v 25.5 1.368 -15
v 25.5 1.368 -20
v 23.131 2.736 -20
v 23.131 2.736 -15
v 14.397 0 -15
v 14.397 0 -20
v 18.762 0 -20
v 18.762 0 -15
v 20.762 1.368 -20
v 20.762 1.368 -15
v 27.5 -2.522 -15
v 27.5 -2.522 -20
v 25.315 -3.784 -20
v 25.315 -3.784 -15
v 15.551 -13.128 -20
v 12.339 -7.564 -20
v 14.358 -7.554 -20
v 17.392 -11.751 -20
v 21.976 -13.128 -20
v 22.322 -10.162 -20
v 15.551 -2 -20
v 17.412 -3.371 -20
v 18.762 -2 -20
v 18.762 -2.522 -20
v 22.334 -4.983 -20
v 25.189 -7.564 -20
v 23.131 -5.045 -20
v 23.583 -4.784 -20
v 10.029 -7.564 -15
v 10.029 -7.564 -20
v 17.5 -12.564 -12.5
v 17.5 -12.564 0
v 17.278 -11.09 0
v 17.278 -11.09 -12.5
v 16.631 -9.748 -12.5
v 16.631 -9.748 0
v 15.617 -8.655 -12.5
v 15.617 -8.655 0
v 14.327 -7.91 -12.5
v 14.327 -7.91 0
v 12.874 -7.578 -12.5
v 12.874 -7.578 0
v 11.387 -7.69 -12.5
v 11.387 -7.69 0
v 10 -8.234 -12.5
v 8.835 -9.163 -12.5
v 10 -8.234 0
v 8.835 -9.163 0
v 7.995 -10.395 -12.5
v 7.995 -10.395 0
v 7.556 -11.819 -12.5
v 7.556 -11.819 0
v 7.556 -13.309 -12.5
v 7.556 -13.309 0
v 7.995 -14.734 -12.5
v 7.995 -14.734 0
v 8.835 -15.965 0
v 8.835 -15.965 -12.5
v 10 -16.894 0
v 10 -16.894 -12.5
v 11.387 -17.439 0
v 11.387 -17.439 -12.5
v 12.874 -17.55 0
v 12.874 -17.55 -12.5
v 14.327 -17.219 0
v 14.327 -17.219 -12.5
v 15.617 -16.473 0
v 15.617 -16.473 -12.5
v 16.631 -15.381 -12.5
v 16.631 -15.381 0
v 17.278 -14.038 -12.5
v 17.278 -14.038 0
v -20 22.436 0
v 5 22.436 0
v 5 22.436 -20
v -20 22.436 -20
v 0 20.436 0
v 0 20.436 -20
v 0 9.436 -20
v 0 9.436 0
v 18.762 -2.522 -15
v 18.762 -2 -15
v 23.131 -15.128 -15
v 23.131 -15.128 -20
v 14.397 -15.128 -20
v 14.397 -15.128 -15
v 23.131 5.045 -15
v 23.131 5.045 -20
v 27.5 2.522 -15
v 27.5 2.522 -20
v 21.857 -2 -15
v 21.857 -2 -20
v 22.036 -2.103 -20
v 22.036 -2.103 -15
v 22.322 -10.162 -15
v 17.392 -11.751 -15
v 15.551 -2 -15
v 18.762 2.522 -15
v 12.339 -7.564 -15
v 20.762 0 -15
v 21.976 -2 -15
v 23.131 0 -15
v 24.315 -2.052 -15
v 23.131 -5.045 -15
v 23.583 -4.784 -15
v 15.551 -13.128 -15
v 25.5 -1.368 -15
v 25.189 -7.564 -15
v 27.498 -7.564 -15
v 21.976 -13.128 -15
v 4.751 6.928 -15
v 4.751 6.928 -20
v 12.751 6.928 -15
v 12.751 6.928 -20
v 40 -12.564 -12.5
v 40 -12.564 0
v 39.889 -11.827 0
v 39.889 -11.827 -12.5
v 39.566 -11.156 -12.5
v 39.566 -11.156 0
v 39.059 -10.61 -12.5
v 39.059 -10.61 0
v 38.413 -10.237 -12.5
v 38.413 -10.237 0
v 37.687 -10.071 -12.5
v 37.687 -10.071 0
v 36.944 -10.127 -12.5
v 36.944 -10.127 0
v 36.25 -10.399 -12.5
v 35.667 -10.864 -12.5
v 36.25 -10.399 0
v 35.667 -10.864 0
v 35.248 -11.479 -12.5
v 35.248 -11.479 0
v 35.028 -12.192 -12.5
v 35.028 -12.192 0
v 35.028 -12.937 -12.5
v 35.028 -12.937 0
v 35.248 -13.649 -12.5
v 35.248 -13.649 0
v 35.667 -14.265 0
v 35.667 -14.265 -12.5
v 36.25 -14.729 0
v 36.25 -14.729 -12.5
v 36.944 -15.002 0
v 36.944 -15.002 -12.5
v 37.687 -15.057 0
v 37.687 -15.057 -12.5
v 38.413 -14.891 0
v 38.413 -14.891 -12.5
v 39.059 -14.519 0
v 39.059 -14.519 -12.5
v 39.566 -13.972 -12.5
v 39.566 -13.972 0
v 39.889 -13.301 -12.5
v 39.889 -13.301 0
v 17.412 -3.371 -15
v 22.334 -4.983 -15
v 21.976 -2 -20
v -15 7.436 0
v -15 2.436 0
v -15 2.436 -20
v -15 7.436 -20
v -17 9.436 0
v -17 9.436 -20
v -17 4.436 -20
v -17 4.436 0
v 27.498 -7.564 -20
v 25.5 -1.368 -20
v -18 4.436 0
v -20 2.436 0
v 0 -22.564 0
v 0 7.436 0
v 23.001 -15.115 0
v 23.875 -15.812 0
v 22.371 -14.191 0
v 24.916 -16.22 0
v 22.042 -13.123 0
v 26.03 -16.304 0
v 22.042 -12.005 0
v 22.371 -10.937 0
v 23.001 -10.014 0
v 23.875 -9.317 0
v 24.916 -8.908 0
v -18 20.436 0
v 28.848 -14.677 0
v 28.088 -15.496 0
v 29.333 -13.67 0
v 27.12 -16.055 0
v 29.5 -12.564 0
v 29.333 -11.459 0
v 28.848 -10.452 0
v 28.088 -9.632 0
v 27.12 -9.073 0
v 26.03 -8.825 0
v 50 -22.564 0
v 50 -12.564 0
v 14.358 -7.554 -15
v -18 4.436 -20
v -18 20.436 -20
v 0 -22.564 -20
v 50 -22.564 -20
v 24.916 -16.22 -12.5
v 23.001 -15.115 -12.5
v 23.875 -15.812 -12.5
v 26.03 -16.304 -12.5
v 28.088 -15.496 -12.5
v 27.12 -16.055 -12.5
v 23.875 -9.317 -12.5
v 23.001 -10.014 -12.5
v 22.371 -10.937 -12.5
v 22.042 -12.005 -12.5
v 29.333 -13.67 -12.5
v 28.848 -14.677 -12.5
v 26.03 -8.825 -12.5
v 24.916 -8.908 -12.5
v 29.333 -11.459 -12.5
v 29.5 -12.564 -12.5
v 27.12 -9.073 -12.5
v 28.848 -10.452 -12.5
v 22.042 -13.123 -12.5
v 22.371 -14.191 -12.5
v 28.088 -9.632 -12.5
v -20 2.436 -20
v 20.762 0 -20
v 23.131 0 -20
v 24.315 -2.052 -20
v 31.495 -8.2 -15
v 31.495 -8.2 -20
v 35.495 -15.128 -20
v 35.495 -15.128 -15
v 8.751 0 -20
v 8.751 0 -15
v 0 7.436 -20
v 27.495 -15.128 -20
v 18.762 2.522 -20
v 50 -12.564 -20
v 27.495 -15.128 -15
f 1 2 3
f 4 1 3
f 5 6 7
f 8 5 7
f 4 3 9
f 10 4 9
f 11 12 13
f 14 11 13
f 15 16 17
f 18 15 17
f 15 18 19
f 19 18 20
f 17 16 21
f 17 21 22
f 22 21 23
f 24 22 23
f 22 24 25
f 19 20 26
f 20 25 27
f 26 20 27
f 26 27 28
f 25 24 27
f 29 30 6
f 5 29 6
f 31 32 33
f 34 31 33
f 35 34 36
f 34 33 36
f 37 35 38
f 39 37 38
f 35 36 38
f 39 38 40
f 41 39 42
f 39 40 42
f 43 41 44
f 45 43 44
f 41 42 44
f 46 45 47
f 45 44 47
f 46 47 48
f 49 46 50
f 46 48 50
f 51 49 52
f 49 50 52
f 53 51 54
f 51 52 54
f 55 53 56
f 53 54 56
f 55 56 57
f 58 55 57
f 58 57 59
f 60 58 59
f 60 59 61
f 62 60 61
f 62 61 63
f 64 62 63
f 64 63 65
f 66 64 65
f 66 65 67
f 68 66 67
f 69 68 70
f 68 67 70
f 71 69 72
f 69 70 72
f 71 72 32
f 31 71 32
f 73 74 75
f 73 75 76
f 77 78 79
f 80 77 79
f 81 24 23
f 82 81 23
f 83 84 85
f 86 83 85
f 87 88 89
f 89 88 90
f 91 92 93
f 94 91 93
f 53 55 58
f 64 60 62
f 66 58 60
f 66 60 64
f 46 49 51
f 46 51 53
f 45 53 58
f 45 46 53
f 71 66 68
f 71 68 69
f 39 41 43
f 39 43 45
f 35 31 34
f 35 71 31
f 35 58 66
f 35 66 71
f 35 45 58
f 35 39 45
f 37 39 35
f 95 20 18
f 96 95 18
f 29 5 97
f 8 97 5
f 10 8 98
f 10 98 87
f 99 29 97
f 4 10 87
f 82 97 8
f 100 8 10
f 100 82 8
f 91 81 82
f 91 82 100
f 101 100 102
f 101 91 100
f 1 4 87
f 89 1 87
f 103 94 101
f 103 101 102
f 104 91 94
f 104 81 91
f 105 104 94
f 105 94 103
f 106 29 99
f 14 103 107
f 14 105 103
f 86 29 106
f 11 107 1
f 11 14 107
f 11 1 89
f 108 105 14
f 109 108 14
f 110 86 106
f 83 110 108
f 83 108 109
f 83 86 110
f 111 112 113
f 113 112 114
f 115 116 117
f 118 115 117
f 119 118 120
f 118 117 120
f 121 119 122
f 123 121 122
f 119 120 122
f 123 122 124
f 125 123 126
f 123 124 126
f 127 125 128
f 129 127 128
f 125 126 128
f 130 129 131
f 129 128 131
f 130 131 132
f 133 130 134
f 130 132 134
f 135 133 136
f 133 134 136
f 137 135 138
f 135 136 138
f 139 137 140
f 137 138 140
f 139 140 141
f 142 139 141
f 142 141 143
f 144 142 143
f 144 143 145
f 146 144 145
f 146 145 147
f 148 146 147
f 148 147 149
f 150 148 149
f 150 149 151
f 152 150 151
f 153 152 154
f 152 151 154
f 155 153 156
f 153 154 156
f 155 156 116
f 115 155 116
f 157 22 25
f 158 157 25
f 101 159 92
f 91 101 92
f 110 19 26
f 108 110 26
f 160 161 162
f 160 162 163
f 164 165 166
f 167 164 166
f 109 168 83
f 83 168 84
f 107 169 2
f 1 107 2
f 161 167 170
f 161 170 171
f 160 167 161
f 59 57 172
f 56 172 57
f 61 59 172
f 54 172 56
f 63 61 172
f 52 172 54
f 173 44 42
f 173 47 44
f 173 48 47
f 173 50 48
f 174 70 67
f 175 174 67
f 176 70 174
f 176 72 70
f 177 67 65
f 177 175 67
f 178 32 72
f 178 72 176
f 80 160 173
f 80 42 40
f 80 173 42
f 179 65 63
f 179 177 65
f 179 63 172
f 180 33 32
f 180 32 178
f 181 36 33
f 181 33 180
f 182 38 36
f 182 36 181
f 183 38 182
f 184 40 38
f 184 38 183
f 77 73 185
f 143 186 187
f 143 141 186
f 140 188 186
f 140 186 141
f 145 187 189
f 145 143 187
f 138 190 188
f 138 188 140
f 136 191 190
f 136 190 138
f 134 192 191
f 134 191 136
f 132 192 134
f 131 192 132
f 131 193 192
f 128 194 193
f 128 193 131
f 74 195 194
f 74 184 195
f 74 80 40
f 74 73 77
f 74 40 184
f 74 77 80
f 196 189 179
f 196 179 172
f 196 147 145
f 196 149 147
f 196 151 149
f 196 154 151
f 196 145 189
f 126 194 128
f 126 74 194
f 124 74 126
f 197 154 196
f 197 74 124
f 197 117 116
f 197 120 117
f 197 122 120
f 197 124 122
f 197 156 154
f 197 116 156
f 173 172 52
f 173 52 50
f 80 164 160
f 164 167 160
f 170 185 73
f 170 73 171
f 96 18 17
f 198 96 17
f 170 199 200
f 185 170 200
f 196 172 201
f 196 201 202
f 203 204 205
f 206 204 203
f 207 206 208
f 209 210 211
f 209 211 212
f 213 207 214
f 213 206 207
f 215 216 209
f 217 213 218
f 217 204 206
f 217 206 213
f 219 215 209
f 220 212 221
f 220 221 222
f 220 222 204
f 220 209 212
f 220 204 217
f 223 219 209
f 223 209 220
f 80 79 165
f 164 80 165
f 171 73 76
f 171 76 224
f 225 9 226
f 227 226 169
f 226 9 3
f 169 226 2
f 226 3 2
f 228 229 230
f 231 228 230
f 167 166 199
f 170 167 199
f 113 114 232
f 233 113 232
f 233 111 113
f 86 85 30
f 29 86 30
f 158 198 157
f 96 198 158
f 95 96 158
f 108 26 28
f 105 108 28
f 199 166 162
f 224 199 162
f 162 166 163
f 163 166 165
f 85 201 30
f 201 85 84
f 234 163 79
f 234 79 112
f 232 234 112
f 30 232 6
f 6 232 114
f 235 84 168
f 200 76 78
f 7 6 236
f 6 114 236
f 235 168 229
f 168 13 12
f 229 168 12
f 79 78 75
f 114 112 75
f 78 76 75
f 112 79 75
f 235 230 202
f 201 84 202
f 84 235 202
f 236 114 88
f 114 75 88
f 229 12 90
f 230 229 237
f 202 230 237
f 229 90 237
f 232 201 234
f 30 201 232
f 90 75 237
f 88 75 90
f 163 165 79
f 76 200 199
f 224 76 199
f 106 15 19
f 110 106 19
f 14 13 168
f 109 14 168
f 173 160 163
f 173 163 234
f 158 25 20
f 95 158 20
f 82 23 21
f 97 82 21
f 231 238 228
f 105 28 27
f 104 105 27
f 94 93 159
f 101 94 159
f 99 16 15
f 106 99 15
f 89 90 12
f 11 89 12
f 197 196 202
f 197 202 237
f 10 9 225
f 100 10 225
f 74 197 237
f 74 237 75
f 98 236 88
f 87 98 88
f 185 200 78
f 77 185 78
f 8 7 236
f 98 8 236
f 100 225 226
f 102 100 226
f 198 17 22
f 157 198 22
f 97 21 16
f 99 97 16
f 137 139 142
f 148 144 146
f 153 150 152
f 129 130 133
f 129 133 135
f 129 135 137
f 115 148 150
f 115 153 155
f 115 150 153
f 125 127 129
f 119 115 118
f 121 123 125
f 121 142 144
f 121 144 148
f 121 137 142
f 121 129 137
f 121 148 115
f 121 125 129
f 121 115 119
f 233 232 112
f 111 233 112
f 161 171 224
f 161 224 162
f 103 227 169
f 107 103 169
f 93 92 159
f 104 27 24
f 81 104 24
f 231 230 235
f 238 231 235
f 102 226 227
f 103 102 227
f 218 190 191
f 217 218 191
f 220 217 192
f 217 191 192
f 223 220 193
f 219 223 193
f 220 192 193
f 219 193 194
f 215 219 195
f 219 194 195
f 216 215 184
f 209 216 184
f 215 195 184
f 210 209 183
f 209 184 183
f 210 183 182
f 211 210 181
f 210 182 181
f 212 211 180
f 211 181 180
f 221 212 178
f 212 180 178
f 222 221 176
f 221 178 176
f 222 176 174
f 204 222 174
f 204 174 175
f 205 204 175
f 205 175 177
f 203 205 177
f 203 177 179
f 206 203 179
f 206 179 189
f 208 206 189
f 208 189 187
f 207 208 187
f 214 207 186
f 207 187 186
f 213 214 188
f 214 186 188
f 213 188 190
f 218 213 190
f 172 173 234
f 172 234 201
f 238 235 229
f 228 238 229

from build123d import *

# Parameters (mm, degrees)
F0_R     = 5
F0_R_2   = 3.75
F0_R_3   = 2.5
F1_DEPTH = 20
F2_DEPTH = 12.5
F4_DEPTH = 5
F5_DEPTH = 20.001


with BuildPart() as f1:
    # F0 (on Top) → F1 (new body)
    with BuildSketch(Plane.XY):
        Polygon((0, 7.4358002841), (0, -22.5641997159), (50, -22.5641997159), (50, -12.5641997159), (5, 22.4358002841), (-20, 22.4358002841), (-20, 2.4358002841), (-15, 2.4358002841), (-15, 7.4358002841), align=None)
        with Locations((12.5, -12.5641997159)):
            Circle(F0_R, mode=Mode.SUBTRACT)
        with Locations((25.75, -12.5641997159)):
            Circle(F0_R_2, mode=Mode.SUBTRACT)
        with Locations((37.5, -12.5641997159)):
            Circle(F0_R_3, mode=Mode.SUBTRACT)
        with Locations((12.5, -12.5641997159)):
            Circle(F0_R)
        with Locations((25.75, -12.5641997159)):
            Circle(F0_R_2)
        with Locations((37.5, -12.5641997159)):
            Circle(F0_R_3)
    extrude(amount=-F1_DEPTH)

    # F0 (on Top) → F2 (cut, symmetric)
    with BuildSketch(Plane.XY):
        with Locations((12.5, -12.5641997159)):
            Circle(F0_R)
        with Locations((25.75, -12.5641997159)):
            Circle(F0_R_2)
        with Locations((37.5, -12.5641997159)):
            Circle(F0_R_3)
    extrude(amount=F2_DEPTH, both=True, mode=Mode.SUBTRACT)

    # F3 (on face) → F4 (cut)
    with BuildSketch(Plane(origin=(0, 0, -20), x_dir=(1, 0, 0), z_dir=(0, 0, -1))):
        Polygon((20.7619503973, 0), (23.1309751987, 0), (24.3154875993, 2.0516356601), (23.1309751987, 2.7355142135), (22.0358983849, 2.1032713203), (21.9762746603, 2), (21.8570272111, 2), (20.7619503973, 1.3677571068), align=None)
        Polygon((20.7619503973, -1.3677571068), (20.7619503973, 0), (18.7619503973, 0), (18.7619503973, -2.5224576451), (23.1309751987, -5.0449152903), (27.5, -2.5224576451), (27.5, 2.5224576451), (25.3154875993, 3.7836864677), (24.3154875993, 2.0516356601), (25.5, 1.3677571068), (25.5, -1.3677571068), (23.1309751987, -2.7355142135), align=None)
        Polygon((18.7619503973, 0), (20.7619503973, 0), (20.7619503973, 1.3677571068), (21.8570272111, 2), (18.7619503973, 2), align=None)
        Polygon((23.1309751987, 2.7355142135), (24.3154875993, 2.0516356601), (25.3154875993, 3.7836864677), (23.5834367918, 4.7836864677), (22.0358983849, 2.1032713203), align=None)
        Polygon((14.3965897144, 0), (18.7619503973, 0), (18.7619503973, 2), (15.5512902527, 2), (12.338798049, 7.5641997159), (15.5512902527, 13.1283994317), (21.9762746603, 13.1283994317), (25.1887668641, 7.5641997159), (23.5834367918, 4.7836864677), (25.3154875993, 3.7836864677), (27.4981679408, 7.5641997159), (23.1309751987, 15.1283994317), (14.3965897144, 15.1283994317), (10.0293969722, 7.5641997159), align=None)
        Polygon((18.7619503973, 2.5224576451), (18.7619503973, 2), (21.8570272111, 2), (22.0358983849, 2.1032713203), (23.5834367918, 4.7836864677), (23.1309751987, 5.0449152903), align=None)
        Polygon((22.3340887545, 4.9830829416), (22.3218557052, 10.162153838), (17.3924863607, 11.7509404388), (14.358201612, 7.5537936626), (17.4122798502, 3.3710276983), align=None)
        Polygon((35.4952501059, 15.1283994317), (27.4952501059, 15.1283994317), (31.4952501059, 8.2001962014), align=None)
        Polygon((12.7505299598, -6.9282032303), (8.7505299598, 0), (4.7505299598, -6.9282032303), align=None)
        Polygon((0, -9.4358002841), (-15, -9.4358002841), (-17, -9.4358002841), (-17, -4.4358002841), (-18, -4.4358002841), (-18, -20.4358002841), (-15, -20.4358002841), (0, -20.4358002841), align=None)
    extrude(amount=-F4_DEPTH, mode=Mode.SUBTRACT)

    # F3 (on face) → F5 (cut, through all)
    with BuildSketch(Plane(origin=(0, 0, -20), x_dir=(1, 0, 0), z_dir=(0, 0, -1))):
        Polygon((0, -9.4358002841), (-15, -9.4358002841), (-17, -9.4358002841), (-17, -4.4358002841), (-18, -4.4358002841), (-18, -20.4358002841), (-15, -20.4358002841), (0, -20.4358002841), align=None)
    extrude(amount=-F5_DEPTH, mode=Mode.SUBTRACT)


solid = f1.part
